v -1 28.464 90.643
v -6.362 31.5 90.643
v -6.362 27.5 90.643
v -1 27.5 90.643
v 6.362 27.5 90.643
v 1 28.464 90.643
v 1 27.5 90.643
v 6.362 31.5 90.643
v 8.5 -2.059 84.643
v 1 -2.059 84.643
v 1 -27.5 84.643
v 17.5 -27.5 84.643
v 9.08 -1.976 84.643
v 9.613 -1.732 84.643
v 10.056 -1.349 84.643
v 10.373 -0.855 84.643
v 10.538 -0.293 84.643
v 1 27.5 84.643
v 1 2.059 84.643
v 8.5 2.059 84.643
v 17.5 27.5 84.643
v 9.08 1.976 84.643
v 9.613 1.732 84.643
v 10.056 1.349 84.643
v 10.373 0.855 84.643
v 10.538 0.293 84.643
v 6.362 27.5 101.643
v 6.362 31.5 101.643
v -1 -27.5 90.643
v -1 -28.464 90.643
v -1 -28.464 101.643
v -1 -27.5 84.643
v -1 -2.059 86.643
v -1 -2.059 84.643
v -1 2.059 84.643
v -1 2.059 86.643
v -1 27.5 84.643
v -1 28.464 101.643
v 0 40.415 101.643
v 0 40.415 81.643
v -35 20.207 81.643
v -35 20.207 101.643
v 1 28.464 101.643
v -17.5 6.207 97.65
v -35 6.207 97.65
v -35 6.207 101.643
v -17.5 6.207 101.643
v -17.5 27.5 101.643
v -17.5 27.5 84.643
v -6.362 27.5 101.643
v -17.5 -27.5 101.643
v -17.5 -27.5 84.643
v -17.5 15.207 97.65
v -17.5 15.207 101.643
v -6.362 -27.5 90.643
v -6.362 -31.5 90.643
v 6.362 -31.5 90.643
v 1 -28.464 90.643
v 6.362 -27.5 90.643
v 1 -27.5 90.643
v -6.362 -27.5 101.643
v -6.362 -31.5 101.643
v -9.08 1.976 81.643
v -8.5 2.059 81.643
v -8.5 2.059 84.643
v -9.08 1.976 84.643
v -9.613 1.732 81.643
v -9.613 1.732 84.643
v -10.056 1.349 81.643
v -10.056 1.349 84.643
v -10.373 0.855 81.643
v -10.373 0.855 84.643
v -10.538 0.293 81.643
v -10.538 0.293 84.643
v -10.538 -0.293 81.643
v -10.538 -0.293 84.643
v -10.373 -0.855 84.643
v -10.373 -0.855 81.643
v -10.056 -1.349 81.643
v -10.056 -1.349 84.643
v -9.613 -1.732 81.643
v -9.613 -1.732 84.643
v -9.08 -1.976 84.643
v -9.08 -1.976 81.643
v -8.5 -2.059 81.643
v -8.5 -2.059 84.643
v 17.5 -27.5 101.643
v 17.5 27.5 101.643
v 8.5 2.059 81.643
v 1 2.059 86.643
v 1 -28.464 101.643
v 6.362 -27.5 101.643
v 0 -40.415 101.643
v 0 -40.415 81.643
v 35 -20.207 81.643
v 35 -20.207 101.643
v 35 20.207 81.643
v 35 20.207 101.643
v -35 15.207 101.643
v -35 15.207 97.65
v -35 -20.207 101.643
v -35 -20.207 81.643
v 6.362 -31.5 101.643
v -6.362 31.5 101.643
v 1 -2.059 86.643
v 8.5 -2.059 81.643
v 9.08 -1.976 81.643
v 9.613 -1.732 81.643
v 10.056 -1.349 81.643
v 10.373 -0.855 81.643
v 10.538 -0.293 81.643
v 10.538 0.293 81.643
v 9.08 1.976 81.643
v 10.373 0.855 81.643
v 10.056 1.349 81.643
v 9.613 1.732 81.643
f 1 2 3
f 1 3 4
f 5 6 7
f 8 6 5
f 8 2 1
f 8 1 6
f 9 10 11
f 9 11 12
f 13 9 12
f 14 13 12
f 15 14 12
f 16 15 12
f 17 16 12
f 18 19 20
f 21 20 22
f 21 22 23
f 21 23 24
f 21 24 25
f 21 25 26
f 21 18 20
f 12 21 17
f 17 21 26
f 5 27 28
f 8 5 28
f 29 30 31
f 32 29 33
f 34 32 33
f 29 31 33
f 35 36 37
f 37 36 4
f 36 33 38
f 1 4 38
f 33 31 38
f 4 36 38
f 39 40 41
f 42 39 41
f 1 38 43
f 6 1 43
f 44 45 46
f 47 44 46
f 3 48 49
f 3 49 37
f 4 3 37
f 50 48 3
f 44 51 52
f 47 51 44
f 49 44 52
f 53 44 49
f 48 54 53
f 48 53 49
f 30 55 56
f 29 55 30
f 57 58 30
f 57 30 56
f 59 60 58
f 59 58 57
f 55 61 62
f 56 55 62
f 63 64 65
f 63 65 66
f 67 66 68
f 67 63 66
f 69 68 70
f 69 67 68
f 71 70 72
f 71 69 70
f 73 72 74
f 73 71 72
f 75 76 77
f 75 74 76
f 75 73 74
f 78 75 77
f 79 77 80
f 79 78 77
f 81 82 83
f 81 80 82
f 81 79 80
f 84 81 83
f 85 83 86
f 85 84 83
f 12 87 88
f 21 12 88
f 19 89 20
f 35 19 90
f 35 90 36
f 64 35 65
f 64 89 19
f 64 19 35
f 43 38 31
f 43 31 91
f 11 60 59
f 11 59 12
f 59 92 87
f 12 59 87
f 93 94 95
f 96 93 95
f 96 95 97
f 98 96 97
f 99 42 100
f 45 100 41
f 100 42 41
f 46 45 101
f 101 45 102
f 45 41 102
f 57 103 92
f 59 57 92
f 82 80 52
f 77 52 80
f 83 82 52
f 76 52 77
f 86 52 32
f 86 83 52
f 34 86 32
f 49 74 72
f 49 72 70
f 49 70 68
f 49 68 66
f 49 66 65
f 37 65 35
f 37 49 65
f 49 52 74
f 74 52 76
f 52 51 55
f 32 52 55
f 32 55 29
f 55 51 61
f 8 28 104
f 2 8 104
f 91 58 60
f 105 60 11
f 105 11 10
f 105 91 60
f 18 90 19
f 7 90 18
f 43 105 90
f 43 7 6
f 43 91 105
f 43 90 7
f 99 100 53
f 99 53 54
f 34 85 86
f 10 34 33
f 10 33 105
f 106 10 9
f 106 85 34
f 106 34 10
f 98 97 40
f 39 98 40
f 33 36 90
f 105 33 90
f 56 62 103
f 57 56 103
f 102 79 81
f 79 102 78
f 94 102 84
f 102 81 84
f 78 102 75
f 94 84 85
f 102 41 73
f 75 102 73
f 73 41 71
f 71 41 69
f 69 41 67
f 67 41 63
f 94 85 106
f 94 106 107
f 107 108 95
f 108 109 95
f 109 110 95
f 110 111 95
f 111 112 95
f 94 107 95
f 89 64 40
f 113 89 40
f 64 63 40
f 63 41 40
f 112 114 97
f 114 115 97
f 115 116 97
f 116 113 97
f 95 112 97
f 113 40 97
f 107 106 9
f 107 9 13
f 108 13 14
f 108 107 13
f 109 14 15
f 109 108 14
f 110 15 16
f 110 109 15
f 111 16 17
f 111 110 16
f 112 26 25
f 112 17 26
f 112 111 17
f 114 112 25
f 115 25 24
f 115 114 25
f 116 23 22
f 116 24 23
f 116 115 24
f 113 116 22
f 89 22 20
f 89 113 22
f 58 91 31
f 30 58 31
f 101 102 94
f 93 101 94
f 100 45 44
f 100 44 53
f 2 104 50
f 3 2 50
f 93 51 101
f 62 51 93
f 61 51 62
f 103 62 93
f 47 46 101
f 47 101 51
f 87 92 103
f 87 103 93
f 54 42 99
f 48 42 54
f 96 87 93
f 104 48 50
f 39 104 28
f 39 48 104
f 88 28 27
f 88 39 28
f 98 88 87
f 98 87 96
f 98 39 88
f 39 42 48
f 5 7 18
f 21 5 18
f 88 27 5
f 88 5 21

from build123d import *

# Parameters (mm, degrees)
BOSS_EXTRUDE1_DEPTH = 200
SKETCH2_W           = 165
SKETCH2_H           = 550
CUT_EXTRUDE1_DEPTH  = 170
CUT_EXTRUDE2_DEPTH  = 50
CUT_EXTRUDE5_DEPTH  = 110
SCALE1_SCALE        = 0.1
SKETCH7_W           = 4
SKETCH7_H           = 9
CUT_EXTRUDE6_DEPTH  = 17.5


with BuildPart() as part:
    # Sketch1 → Boss-Extrude1 (new body)
    with BuildSketch(Plane.XY):
        Polygon((0, 404.145188433), (-350, 202.072594216), (-350, -202.072594216), (0, -404.145188433), (350, -202.072594216), (350, 202.072594216), align=None)
    extrude(amount=BOSS_EXTRUDE1_DEPTH)

    # Sketch2 → Cut-Extrude1 (cut)
    with BuildSketch(Plane.XY.offset(200)):
        with Locations((-92.5, 0)):
            Rectangle(SKETCH2_W, SKETCH2_H)
        with Locations((92.5, 0)):
            Rectangle(SKETCH2_W, SKETCH2_H)
    extrude(amount=-CUT_EXTRUDE1_DEPTH, mode=Mode.SUBTRACT)

    # Sketch4 → Cut-Extrude2 (cut)
    with BuildSketch(Plane(origin=(0, 0, 0), x_dir=(-1, 0, 0), z_dir=(0, 0, -1))):
        with BuildLine():
            Line((-85, 20.592361582), (85, 20.592361582))
            ThreePointArc((85, 20.592361582), (105.592361582, 0), (85, -20.592361582))
            Line((85, -20.592361582), (-85, -20.592361582))
            ThreePointArc((-85, -20.592361582), (-105.592361582, 0), (-85, 20.592361582))
        make_face()
    extrude(amount=-CUT_EXTRUDE2_DEPTH, mode=Mode.SUBTRACT)

    # Sketch6 → Cut-Extrude5 (cut)
    with BuildSketch(Plane.XY.offset(200)):
        Polygon((-10, 275), (-10, 284.635017666), (10, 284.635017666), (10, 275), (63.624515443, 275), (63.624515443, 315), (-63.624515443, 315), (-63.624515443, 275), align=None)
        Polygon((-10, -275), (-63.624515443, -275), (-63.624515443, -315), (63.624515443, -315), (63.624515443, -275), (10, -275), (10, -284.635017666), (-10, -284.635017666), align=None)
    extrude(amount=-CUT_EXTRUDE5_DEPTH, mode=Mode.SUBTRACT)


with BuildPart() as part_1:
    # Scale1: scaled about (0, 0, 90.714754865)
    add(part.part.scale(SCALE1_SCALE).moved(Location((0, 0, 81.643279379))))

    # Sketch7 → Cut-Extrude6 (cut)
    with BuildSketch(Plane.ZY.offset(35)):
        with Locations((99.650437811, 10.707259422)):
            Rectangle(SKETCH7_W, SKETCH7_H)
    extrude(amount=-CUT_EXTRUDE6_DEPTH, mode=Mode.SUBTRACT)


solid = part_1.part
